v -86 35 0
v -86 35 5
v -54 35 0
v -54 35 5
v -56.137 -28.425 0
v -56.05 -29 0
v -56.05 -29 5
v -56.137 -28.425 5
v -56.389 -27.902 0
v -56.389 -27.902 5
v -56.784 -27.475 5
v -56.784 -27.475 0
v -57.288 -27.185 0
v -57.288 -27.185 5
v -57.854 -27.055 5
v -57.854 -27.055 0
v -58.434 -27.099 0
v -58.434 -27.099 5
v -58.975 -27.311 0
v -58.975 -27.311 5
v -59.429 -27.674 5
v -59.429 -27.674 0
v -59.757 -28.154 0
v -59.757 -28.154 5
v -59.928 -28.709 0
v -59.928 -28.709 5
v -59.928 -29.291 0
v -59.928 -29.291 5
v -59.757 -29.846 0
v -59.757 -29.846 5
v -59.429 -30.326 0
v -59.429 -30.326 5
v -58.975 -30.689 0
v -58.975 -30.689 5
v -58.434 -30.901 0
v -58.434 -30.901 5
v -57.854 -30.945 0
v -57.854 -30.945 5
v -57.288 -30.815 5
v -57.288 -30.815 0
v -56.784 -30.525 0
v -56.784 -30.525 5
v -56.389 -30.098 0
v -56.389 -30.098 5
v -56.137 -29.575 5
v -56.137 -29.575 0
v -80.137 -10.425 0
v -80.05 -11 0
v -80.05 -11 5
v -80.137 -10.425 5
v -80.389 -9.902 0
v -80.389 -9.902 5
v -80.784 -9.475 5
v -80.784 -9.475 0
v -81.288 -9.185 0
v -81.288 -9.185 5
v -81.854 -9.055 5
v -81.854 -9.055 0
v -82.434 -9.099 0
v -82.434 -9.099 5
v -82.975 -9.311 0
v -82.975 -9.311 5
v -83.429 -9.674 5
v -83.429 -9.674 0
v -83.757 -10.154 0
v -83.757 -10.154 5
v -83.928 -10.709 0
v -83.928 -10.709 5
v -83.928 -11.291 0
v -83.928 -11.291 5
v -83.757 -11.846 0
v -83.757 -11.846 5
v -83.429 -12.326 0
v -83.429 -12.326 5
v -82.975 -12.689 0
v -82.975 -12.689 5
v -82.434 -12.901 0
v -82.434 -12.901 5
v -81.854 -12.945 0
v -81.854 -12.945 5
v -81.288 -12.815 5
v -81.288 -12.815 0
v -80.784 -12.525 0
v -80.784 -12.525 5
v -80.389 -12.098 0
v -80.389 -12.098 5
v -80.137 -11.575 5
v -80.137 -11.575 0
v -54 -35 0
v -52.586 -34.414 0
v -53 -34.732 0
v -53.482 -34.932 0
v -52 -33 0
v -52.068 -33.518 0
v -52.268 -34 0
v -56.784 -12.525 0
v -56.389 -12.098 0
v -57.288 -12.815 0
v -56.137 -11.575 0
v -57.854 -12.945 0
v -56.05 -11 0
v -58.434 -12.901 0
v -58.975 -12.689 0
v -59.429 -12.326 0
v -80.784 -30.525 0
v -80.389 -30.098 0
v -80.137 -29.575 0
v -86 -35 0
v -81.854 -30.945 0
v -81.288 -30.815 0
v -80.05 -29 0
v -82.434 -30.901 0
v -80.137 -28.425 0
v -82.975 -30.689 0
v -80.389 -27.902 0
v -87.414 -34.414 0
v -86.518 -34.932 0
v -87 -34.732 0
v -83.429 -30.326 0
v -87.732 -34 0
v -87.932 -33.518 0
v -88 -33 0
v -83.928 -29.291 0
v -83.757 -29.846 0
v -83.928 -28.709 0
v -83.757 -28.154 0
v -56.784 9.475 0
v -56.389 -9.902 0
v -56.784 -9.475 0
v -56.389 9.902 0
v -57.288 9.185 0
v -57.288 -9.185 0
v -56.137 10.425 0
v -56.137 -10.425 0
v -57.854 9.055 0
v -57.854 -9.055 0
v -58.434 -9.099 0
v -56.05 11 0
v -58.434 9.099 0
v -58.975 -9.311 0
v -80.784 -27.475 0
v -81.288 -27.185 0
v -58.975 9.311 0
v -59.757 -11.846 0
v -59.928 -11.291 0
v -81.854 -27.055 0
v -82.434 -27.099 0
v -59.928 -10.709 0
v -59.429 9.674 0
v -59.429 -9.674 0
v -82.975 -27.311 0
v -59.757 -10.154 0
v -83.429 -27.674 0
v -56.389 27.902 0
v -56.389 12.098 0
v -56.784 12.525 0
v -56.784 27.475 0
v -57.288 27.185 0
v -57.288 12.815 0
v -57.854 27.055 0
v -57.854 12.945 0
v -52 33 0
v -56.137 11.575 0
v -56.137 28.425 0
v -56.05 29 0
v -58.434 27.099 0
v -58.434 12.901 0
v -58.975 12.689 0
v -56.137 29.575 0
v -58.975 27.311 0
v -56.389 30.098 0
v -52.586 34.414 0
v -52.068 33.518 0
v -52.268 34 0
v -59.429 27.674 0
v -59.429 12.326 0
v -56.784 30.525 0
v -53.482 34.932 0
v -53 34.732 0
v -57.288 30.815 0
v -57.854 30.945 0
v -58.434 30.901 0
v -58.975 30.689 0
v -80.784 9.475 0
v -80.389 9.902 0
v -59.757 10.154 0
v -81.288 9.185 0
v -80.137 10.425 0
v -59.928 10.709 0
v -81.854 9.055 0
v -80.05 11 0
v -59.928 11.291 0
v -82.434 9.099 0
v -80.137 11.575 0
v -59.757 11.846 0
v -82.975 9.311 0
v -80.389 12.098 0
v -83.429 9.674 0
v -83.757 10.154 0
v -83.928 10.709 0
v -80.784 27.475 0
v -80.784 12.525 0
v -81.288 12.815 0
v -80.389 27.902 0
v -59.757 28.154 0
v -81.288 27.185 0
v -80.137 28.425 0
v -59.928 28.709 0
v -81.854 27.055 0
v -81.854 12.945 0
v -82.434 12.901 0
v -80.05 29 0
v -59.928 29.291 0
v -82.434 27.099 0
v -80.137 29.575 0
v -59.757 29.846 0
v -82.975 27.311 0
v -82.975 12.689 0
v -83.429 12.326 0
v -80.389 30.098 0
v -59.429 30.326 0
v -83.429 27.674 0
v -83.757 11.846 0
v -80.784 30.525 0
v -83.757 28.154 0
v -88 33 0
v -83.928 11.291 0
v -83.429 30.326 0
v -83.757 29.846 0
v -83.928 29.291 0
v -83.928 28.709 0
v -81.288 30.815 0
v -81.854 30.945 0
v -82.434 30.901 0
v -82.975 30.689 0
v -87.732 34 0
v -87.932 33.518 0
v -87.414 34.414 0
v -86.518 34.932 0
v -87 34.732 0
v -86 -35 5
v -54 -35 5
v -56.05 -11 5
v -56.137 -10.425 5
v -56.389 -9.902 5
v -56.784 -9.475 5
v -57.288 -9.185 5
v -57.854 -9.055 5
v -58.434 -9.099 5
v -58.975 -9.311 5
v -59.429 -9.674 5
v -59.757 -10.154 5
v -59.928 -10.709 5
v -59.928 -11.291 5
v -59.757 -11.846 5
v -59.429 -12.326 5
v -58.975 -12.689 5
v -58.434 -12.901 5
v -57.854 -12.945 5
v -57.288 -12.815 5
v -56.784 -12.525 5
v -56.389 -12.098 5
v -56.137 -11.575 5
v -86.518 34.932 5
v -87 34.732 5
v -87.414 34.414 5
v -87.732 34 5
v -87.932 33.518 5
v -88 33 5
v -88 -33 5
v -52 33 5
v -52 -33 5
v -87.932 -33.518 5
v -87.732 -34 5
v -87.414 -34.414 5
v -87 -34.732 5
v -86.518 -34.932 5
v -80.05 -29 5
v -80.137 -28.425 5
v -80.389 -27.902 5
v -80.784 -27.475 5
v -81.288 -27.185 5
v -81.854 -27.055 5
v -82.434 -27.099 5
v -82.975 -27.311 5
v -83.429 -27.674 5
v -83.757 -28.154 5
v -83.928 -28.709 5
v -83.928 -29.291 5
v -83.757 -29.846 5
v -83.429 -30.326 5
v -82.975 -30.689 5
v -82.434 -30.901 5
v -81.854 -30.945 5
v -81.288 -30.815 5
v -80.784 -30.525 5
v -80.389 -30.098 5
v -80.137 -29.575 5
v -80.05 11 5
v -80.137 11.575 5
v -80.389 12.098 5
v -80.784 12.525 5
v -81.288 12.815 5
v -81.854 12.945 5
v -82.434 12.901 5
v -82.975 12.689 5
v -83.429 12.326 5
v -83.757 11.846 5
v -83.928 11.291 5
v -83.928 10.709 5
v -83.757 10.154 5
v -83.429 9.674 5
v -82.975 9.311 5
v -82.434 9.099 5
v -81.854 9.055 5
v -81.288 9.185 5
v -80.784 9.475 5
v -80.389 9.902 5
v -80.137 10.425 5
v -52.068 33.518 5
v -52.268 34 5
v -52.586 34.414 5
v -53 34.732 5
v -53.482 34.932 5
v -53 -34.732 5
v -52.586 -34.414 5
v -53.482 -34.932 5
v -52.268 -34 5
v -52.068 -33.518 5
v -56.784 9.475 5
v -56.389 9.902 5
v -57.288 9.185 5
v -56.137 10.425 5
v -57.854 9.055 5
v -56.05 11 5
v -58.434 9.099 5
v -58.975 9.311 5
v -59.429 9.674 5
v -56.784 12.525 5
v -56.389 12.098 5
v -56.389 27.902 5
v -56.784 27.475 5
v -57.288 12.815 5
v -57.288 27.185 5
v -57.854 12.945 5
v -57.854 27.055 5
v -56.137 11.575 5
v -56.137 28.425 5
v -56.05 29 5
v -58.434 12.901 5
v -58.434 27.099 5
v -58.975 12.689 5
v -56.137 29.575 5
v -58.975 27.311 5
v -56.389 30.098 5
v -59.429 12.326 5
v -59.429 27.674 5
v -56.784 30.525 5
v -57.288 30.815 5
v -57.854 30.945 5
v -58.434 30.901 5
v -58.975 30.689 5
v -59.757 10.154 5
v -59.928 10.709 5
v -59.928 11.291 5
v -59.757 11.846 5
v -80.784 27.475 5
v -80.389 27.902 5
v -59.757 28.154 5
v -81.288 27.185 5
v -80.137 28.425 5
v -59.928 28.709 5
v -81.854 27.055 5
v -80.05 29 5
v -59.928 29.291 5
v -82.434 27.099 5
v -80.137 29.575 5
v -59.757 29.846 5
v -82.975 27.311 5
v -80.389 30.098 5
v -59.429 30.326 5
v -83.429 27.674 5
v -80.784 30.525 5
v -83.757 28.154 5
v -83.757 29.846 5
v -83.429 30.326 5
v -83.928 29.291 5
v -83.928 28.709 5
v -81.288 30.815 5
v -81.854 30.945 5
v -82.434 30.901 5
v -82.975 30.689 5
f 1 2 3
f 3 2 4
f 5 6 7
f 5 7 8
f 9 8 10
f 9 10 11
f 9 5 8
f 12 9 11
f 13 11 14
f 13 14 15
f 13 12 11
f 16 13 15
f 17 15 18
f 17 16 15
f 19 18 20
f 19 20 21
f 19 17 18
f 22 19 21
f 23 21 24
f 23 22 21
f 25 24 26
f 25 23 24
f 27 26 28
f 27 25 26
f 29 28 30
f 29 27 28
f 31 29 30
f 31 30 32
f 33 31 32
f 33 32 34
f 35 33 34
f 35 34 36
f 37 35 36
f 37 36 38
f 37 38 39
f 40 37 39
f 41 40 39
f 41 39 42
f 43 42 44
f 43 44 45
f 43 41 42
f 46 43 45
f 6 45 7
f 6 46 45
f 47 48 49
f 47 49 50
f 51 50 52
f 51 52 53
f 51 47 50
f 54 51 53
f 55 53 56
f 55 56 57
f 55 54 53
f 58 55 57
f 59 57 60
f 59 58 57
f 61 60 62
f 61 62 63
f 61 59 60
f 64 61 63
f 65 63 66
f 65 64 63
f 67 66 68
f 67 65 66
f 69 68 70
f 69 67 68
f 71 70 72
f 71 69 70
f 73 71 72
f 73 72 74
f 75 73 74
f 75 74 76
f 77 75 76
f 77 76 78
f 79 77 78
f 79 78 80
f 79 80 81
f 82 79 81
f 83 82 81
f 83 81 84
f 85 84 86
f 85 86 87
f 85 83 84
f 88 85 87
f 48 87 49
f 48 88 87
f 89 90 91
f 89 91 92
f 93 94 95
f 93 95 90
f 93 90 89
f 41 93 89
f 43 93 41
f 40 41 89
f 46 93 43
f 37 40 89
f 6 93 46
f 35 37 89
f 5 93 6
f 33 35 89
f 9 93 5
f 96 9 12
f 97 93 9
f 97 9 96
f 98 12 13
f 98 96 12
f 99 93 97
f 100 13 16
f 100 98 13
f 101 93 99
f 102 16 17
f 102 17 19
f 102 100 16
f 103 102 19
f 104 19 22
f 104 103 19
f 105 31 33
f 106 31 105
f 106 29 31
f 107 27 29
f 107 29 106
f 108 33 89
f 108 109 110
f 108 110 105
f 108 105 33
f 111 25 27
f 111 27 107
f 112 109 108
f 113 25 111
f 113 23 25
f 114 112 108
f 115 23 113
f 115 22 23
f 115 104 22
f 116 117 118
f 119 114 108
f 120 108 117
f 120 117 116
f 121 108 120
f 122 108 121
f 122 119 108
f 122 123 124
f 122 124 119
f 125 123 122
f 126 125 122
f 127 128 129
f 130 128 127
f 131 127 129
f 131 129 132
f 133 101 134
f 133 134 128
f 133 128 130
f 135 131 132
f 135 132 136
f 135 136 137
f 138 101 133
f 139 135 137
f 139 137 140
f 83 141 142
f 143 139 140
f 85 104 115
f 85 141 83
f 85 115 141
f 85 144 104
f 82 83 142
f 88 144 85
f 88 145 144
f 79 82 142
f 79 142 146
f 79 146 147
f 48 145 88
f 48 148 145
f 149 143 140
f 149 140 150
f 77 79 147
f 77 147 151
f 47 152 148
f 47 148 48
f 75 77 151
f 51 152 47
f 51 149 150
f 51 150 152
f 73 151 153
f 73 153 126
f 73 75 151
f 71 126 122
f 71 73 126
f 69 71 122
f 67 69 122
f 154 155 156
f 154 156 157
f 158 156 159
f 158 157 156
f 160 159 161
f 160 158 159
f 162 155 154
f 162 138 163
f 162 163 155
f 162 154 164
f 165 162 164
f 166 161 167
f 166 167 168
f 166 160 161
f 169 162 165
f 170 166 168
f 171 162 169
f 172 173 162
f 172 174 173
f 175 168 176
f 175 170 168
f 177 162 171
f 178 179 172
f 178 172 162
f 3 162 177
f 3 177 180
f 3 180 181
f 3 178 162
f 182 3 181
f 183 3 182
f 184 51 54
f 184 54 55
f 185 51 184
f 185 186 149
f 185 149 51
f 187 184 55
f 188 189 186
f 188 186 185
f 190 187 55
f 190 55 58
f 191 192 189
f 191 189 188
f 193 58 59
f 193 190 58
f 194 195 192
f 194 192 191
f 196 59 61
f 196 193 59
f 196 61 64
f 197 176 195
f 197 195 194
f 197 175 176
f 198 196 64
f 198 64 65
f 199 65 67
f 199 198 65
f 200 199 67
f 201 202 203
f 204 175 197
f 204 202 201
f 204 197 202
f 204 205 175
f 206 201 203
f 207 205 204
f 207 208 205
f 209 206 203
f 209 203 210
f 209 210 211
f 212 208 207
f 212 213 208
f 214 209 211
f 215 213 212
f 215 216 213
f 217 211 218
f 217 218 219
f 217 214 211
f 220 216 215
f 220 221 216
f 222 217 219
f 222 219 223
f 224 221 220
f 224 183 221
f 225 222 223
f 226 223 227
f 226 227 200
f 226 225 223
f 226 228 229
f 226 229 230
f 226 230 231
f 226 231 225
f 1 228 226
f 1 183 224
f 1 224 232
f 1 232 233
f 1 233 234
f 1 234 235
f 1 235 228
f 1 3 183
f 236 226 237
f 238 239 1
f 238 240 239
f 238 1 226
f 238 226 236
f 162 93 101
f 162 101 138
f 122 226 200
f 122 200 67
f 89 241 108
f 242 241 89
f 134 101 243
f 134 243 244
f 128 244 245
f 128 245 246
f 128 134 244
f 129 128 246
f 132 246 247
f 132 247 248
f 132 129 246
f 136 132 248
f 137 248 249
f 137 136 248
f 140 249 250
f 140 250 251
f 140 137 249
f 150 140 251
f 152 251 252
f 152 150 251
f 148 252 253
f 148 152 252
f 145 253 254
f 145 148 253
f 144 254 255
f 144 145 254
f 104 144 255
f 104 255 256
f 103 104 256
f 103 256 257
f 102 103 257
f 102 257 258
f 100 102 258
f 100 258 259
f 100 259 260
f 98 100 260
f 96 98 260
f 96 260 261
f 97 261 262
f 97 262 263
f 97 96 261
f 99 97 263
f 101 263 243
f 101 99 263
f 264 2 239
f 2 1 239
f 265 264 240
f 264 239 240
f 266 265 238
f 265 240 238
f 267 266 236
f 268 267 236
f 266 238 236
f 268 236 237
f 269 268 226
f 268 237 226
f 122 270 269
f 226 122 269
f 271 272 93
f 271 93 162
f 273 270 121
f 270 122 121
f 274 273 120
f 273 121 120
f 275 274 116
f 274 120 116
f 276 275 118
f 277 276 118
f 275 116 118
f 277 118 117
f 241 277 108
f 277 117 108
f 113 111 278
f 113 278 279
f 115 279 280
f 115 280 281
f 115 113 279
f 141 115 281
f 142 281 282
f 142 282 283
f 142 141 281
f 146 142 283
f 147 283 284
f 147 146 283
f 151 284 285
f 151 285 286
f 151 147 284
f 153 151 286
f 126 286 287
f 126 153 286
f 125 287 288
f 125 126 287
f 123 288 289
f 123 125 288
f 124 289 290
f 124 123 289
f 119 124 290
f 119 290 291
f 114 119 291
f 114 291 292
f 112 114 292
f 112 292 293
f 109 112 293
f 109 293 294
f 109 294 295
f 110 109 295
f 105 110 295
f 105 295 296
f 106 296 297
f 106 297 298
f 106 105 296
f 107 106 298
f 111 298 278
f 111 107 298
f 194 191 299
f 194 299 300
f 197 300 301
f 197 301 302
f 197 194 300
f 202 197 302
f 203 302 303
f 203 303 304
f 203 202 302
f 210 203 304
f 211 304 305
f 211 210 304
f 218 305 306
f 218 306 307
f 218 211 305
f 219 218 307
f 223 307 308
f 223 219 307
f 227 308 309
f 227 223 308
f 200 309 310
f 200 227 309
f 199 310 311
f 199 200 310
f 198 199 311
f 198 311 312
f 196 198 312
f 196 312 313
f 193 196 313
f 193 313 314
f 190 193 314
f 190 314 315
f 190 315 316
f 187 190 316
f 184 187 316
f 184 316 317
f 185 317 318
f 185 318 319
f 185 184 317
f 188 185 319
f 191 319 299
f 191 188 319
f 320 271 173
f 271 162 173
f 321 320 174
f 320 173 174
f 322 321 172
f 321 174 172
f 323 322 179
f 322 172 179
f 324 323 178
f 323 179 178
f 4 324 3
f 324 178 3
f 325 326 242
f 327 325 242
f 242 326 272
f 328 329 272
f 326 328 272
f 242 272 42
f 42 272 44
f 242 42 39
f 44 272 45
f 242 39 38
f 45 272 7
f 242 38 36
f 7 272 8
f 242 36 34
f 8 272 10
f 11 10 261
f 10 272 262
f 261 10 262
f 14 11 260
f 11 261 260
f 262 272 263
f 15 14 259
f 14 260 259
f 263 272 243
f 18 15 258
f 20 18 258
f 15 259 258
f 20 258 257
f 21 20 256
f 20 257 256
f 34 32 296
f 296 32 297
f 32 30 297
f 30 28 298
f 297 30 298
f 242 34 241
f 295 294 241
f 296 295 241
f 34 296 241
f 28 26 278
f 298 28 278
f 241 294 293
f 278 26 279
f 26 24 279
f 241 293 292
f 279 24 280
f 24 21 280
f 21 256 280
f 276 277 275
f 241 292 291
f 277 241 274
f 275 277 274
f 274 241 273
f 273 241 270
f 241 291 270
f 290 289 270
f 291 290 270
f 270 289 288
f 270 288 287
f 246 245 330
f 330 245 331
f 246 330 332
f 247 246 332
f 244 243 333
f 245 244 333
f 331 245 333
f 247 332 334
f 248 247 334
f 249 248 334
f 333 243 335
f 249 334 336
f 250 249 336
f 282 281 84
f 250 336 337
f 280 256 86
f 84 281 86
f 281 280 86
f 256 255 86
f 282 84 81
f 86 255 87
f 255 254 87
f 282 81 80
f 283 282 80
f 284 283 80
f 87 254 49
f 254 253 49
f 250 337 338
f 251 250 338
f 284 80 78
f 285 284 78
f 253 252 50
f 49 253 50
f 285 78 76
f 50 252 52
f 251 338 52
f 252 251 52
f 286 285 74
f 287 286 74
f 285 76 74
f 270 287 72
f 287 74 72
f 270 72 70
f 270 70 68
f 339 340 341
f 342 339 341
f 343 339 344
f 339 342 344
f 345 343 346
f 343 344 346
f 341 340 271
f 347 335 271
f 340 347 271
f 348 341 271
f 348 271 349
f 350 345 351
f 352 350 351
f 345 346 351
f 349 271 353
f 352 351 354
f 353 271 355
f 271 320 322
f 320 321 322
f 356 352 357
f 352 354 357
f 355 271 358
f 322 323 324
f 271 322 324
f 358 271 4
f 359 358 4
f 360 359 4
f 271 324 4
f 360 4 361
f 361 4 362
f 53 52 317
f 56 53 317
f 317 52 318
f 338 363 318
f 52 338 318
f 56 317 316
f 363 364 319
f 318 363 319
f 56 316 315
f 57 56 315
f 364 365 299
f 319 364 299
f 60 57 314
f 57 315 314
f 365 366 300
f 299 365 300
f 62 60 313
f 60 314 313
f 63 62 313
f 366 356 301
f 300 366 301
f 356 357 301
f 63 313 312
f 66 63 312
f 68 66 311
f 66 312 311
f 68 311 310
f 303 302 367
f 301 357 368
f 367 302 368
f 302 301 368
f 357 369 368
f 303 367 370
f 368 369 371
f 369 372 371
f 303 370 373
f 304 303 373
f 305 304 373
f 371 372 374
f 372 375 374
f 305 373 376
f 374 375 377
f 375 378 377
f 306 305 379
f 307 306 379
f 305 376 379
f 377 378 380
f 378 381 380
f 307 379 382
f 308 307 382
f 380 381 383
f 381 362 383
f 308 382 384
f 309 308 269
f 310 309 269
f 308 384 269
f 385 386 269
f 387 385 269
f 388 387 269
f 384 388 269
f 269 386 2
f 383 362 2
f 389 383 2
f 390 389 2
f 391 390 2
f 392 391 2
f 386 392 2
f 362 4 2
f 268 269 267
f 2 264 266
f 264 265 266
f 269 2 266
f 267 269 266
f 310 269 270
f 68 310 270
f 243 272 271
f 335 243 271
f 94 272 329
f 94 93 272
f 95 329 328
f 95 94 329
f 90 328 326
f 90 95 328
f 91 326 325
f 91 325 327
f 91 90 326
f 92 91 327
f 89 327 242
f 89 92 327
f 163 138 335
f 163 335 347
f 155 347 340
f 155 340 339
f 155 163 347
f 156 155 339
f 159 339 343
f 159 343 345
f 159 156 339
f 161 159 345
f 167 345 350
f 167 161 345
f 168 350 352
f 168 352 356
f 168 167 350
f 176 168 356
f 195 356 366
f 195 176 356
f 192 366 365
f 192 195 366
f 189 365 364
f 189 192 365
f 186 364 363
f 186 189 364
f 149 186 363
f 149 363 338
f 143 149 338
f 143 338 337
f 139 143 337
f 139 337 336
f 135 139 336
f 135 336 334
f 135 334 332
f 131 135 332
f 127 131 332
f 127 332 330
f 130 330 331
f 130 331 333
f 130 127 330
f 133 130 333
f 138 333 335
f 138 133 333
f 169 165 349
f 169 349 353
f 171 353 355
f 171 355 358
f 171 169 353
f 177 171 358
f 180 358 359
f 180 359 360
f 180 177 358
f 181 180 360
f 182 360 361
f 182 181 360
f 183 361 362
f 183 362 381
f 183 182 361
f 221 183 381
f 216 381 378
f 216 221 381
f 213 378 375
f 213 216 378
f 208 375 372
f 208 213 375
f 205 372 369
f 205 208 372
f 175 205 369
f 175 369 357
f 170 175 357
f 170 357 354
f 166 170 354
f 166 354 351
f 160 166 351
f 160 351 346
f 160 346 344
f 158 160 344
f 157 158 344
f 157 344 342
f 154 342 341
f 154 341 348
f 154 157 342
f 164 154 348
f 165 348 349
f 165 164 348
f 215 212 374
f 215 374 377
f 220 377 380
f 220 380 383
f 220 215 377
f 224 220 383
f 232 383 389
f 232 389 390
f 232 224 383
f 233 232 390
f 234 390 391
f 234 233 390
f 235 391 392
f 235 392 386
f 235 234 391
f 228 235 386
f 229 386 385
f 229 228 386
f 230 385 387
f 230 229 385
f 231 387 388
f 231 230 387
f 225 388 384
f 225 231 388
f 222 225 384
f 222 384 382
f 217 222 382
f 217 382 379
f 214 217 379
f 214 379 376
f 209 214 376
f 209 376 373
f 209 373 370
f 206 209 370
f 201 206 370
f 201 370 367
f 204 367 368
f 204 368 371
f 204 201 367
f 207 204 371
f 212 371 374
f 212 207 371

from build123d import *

# Parameters (mm, degrees)
SKETCH1_R           = 2
SKETCH1_R_2         = 1.95
SKETCH1_R_3         = 1.5
BOSS_EXTRUDE1_DEPTH = 5
SKETCH2_R           = 1.5
SKETCH2_R_2         = 1.95
SKETCH2_R_3         = 2
SKETCH2_W           = 36
SKETCH2_H           = 70
CUT_EXTRUDE1_DEPTH  = 142.509716981
FILLET1_R           = 2


with BuildPart() as part:
    # Sketch1 → Boss-Extrude1 (new body)
    with BuildSketch(Plane.XY):
        with BuildLine():
            Line((-90, 100), (-70, 100))
            Line((-70, 100), (-14.884168151, 68.505238943))
            ThreePointArc((-14.884168151, 68.505238943), (0, 64.552533207), (14.884168151, 68.505238943))
            Line((14.884168151, 68.505238943), (70, 100))
            Line((70, 100), (90, 100))
            ThreePointArc((90, 100), (97.071067812, 97.071067812), (100, 90))
            Line((100, 90), (100, 29))
            Line((100, 29), (93.372317414, 9.7797205))
            ThreePointArc((93.372317414, 9.7797205), (91.733506862, 0), (93.372317414, -9.7797205))
            Line((93.372317414, -9.7797205), (100, -29))
            Line((100, -29), (100, -90))
            ThreePointArc((100, -90), (97.071067812, -97.071067812), (90, -100))
            Line((90, -100), (70, -100))
            Line((70, -100), (14.884168151, -68.505238943))
            ThreePointArc((14.884168151, -68.505238943), (0, -64.552533207), (-14.884168151, -68.505238943))
            Line((-14.884168151, -68.505238943), (-70, -100))
            Line((-70, -100), (-90, -100))
            ThreePointArc((-90, -100), (-97.071067812, -97.071067812), (-100, -90))
            Line((-100, -90), (-100, -29))
            Line((-100, -29), (-93.372317414, -9.7797205))
            ThreePointArc((-93.372317414, -9.7797205), (-91.733506862, 0), (-93.372317414, 9.7797205))
            Line((-93.372317414, 9.7797205), (-100, 29))
            Line((-100, 29), (-100, 90))
            ThreePointArc((-100, 90), (-97.071067812, 97.071067812), (-90, 100))
        make_face()
        with Locations((-91.923881554, 91.923881554)):
            Circle(SKETCH1_R, mode=Mode.SUBTRACT)
        with Locations((91.923881554, 91.923881554)):
            Circle(SKETCH1_R, mode=Mode.SUBTRACT)
        with Locations((91.923881554, -91.923881554)):
            Circle(SKETCH1_R, mode=Mode.SUBTRACT)
        with Locations((-91.923881554, -91.923881554)):
            Circle(SKETCH1_R, mode=Mode.SUBTRACT)
        with Locations((58, 29)):
            Circle(SKETCH1_R_2, mode=Mode.SUBTRACT)
        with Locations((82, 29)):
            Circle(SKETCH1_R_2, mode=Mode.SUBTRACT)
        with Locations((58, 11)):
            Circle(SKETCH1_R_2, mode=Mode.SUBTRACT)
        with Locations((82, 11)):
            Circle(SKETCH1_R_2, mode=Mode.SUBTRACT)
        with Locations((58, -11)):
            Circle(SKETCH1_R_2, mode=Mode.SUBTRACT)
        with Locations((58, -29)):
            Circle(SKETCH1_R_2, mode=Mode.SUBTRACT)
        with Locations((82, -11)):
            Circle(SKETCH1_R_2, mode=Mode.SUBTRACT)
        with Locations((82, -29)):
            Circle(SKETCH1_R_2, mode=Mode.SUBTRACT)
        with Locations((-82, 29)):
            Circle(SKETCH1_R_2, mode=Mode.SUBTRACT)
        with Locations((-58, 29)):
            Circle(SKETCH1_R_2, mode=Mode.SUBTRACT)
        with Locations((-82, 11)):
            Circle(SKETCH1_R_2, mode=Mode.SUBTRACT)
        with Locations((-58, 11)):
            Circle(SKETCH1_R_2, mode=Mode.SUBTRACT)
        with Locations((-82, -11)):
            Circle(SKETCH1_R_2, mode=Mode.SUBTRACT)
        with Locations((-82, -29)):
            Circle(SKETCH1_R_2, mode=Mode.SUBTRACT)
        with Locations((-58, -11)):
            Circle(SKETCH1_R_2, mode=Mode.SUBTRACT)
        with Locations((-58, -29)):
            Circle(SKETCH1_R_2, mode=Mode.SUBTRACT)
        with Locations((-6, 10)):
            Circle(SKETCH1_R_3, mode=Mode.SUBTRACT)
        with Locations((6, 10)):
            Circle(SKETCH1_R_3, mode=Mode.SUBTRACT)
        with Locations((-6, -10)):
            Circle(SKETCH1_R_3, mode=Mode.SUBTRACT)
        with Locations((6, -10)):
            Circle(SKETCH1_R_3, mode=Mode.SUBTRACT)
    extrude(amount=BOSS_EXTRUDE1_DEPTH)

    # Sketch2 → Cut-Extrude1 (cut, through all)
    with BuildSketch(Plane.XY.offset(5)):
        with BuildLine():
            Line((100, 29), (100, 90))
            ThreePointArc((100, 90), (97.071067812, 97.071067812), (90, 100))
            Line((90, 100), (70, 100))
            Line((70, 100), (14.884168151, 68.505238943))
            ThreePointArc((14.884168151, 68.505238943), (0, 64.552533207), (-14.884168151, 68.505238943))
            Line((-14.884168151, 68.505238943), (-70, 100))
            Line((-70, 100), (-90, 100))
            ThreePointArc((-90, 100), (-97.071067812, 97.071067812), (-100, 90))
            Line((-100, 90), (-100, 29))
            Line((-100, 29), (-93.372317414, 9.7797205))
            ThreePointArc((-93.372317414, 9.7797205), (-91.733506862, 0), (-93.372317414, -9.7797205))
            Line((-93.372317414, -9.7797205), (-100, -29))
            Line((-100, -29), (-100, -90))
            ThreePointArc((-100, -90), (-97.071067812, -97.071067812), (-90, -100))
            Line((-90, -100), (-70, -100))
            Line((-70, -100), (-14.884168151, -68.505238943))
            ThreePointArc((-14.884168151, -68.505238943), (0, -64.552533207), (14.884168151, -68.505238943))
            Line((14.884168151, -68.505238943), (70, -100))
            Line((70, -100), (90, -100))
            ThreePointArc((90, -100), (97.071067812, -97.071067812), (100, -90))
            Line((100, -90), (100, -29))
            Line((100, -29), (93.372317414, -9.7797205))
            ThreePointArc((93.372317414, -9.7797205), (91.733506862, 0), (93.372317414, 9.7797205))
            Line((93.372317414, 9.7797205), (100, 29))
        make_face()
        with Locations((-6, 10)):
            Circle(SKETCH2_R, mode=Mode.SUBTRACT)
        with Locations((58, -11)):
            Circle(SKETCH2_R_2, mode=Mode.SUBTRACT)
        with Locations((58, 29)):
            Circle(SKETCH2_R_2, mode=Mode.SUBTRACT)
        with Locations((-91.923881554, 91.923881554)):
            Circle(SKETCH2_R_3, mode=Mode.SUBTRACT)
        with Locations((91.923881554, 91.923881554)):
            Circle(SKETCH2_R_3, mode=Mode.SUBTRACT)
        with Locations((82, 29)):
            Circle(SKETCH2_R_2, mode=Mode.SUBTRACT)
        with Locations((58, -29)):
            Circle(SKETCH2_R_2, mode=Mode.SUBTRACT)
        with Locations((6, 10)):
            Circle(SKETCH2_R, mode=Mode.SUBTRACT)
        with Locations((6, -10)):
            Circle(SKETCH2_R, mode=Mode.SUBTRACT)
        with Locations((82, -29)):
            Circle(SKETCH2_R_2, mode=Mode.SUBTRACT)
        with Locations((82, 11)):
            Circle(SKETCH2_R_2, mode=Mode.SUBTRACT)
        with Locations((-70, 0)):
            Rectangle(SKETCH2_W, SKETCH2_H, mode=Mode.SUBTRACT)
    extrude(amount=-CUT_EXTRUDE1_DEPTH, mode=Mode.SUBTRACT)

    # Fillet1
    fillet1_edges = [part.edges().sort_by_distance(p)[0] for p in [
        (-52, -35, 2.5),
        (-52, 35, 2.5),
        (-88, 35, 2.5),
        (-88, -35, 2.5),
    ]]
    fillet(fillet1_edges, radius=FILLET1_R)


solid = part.part
